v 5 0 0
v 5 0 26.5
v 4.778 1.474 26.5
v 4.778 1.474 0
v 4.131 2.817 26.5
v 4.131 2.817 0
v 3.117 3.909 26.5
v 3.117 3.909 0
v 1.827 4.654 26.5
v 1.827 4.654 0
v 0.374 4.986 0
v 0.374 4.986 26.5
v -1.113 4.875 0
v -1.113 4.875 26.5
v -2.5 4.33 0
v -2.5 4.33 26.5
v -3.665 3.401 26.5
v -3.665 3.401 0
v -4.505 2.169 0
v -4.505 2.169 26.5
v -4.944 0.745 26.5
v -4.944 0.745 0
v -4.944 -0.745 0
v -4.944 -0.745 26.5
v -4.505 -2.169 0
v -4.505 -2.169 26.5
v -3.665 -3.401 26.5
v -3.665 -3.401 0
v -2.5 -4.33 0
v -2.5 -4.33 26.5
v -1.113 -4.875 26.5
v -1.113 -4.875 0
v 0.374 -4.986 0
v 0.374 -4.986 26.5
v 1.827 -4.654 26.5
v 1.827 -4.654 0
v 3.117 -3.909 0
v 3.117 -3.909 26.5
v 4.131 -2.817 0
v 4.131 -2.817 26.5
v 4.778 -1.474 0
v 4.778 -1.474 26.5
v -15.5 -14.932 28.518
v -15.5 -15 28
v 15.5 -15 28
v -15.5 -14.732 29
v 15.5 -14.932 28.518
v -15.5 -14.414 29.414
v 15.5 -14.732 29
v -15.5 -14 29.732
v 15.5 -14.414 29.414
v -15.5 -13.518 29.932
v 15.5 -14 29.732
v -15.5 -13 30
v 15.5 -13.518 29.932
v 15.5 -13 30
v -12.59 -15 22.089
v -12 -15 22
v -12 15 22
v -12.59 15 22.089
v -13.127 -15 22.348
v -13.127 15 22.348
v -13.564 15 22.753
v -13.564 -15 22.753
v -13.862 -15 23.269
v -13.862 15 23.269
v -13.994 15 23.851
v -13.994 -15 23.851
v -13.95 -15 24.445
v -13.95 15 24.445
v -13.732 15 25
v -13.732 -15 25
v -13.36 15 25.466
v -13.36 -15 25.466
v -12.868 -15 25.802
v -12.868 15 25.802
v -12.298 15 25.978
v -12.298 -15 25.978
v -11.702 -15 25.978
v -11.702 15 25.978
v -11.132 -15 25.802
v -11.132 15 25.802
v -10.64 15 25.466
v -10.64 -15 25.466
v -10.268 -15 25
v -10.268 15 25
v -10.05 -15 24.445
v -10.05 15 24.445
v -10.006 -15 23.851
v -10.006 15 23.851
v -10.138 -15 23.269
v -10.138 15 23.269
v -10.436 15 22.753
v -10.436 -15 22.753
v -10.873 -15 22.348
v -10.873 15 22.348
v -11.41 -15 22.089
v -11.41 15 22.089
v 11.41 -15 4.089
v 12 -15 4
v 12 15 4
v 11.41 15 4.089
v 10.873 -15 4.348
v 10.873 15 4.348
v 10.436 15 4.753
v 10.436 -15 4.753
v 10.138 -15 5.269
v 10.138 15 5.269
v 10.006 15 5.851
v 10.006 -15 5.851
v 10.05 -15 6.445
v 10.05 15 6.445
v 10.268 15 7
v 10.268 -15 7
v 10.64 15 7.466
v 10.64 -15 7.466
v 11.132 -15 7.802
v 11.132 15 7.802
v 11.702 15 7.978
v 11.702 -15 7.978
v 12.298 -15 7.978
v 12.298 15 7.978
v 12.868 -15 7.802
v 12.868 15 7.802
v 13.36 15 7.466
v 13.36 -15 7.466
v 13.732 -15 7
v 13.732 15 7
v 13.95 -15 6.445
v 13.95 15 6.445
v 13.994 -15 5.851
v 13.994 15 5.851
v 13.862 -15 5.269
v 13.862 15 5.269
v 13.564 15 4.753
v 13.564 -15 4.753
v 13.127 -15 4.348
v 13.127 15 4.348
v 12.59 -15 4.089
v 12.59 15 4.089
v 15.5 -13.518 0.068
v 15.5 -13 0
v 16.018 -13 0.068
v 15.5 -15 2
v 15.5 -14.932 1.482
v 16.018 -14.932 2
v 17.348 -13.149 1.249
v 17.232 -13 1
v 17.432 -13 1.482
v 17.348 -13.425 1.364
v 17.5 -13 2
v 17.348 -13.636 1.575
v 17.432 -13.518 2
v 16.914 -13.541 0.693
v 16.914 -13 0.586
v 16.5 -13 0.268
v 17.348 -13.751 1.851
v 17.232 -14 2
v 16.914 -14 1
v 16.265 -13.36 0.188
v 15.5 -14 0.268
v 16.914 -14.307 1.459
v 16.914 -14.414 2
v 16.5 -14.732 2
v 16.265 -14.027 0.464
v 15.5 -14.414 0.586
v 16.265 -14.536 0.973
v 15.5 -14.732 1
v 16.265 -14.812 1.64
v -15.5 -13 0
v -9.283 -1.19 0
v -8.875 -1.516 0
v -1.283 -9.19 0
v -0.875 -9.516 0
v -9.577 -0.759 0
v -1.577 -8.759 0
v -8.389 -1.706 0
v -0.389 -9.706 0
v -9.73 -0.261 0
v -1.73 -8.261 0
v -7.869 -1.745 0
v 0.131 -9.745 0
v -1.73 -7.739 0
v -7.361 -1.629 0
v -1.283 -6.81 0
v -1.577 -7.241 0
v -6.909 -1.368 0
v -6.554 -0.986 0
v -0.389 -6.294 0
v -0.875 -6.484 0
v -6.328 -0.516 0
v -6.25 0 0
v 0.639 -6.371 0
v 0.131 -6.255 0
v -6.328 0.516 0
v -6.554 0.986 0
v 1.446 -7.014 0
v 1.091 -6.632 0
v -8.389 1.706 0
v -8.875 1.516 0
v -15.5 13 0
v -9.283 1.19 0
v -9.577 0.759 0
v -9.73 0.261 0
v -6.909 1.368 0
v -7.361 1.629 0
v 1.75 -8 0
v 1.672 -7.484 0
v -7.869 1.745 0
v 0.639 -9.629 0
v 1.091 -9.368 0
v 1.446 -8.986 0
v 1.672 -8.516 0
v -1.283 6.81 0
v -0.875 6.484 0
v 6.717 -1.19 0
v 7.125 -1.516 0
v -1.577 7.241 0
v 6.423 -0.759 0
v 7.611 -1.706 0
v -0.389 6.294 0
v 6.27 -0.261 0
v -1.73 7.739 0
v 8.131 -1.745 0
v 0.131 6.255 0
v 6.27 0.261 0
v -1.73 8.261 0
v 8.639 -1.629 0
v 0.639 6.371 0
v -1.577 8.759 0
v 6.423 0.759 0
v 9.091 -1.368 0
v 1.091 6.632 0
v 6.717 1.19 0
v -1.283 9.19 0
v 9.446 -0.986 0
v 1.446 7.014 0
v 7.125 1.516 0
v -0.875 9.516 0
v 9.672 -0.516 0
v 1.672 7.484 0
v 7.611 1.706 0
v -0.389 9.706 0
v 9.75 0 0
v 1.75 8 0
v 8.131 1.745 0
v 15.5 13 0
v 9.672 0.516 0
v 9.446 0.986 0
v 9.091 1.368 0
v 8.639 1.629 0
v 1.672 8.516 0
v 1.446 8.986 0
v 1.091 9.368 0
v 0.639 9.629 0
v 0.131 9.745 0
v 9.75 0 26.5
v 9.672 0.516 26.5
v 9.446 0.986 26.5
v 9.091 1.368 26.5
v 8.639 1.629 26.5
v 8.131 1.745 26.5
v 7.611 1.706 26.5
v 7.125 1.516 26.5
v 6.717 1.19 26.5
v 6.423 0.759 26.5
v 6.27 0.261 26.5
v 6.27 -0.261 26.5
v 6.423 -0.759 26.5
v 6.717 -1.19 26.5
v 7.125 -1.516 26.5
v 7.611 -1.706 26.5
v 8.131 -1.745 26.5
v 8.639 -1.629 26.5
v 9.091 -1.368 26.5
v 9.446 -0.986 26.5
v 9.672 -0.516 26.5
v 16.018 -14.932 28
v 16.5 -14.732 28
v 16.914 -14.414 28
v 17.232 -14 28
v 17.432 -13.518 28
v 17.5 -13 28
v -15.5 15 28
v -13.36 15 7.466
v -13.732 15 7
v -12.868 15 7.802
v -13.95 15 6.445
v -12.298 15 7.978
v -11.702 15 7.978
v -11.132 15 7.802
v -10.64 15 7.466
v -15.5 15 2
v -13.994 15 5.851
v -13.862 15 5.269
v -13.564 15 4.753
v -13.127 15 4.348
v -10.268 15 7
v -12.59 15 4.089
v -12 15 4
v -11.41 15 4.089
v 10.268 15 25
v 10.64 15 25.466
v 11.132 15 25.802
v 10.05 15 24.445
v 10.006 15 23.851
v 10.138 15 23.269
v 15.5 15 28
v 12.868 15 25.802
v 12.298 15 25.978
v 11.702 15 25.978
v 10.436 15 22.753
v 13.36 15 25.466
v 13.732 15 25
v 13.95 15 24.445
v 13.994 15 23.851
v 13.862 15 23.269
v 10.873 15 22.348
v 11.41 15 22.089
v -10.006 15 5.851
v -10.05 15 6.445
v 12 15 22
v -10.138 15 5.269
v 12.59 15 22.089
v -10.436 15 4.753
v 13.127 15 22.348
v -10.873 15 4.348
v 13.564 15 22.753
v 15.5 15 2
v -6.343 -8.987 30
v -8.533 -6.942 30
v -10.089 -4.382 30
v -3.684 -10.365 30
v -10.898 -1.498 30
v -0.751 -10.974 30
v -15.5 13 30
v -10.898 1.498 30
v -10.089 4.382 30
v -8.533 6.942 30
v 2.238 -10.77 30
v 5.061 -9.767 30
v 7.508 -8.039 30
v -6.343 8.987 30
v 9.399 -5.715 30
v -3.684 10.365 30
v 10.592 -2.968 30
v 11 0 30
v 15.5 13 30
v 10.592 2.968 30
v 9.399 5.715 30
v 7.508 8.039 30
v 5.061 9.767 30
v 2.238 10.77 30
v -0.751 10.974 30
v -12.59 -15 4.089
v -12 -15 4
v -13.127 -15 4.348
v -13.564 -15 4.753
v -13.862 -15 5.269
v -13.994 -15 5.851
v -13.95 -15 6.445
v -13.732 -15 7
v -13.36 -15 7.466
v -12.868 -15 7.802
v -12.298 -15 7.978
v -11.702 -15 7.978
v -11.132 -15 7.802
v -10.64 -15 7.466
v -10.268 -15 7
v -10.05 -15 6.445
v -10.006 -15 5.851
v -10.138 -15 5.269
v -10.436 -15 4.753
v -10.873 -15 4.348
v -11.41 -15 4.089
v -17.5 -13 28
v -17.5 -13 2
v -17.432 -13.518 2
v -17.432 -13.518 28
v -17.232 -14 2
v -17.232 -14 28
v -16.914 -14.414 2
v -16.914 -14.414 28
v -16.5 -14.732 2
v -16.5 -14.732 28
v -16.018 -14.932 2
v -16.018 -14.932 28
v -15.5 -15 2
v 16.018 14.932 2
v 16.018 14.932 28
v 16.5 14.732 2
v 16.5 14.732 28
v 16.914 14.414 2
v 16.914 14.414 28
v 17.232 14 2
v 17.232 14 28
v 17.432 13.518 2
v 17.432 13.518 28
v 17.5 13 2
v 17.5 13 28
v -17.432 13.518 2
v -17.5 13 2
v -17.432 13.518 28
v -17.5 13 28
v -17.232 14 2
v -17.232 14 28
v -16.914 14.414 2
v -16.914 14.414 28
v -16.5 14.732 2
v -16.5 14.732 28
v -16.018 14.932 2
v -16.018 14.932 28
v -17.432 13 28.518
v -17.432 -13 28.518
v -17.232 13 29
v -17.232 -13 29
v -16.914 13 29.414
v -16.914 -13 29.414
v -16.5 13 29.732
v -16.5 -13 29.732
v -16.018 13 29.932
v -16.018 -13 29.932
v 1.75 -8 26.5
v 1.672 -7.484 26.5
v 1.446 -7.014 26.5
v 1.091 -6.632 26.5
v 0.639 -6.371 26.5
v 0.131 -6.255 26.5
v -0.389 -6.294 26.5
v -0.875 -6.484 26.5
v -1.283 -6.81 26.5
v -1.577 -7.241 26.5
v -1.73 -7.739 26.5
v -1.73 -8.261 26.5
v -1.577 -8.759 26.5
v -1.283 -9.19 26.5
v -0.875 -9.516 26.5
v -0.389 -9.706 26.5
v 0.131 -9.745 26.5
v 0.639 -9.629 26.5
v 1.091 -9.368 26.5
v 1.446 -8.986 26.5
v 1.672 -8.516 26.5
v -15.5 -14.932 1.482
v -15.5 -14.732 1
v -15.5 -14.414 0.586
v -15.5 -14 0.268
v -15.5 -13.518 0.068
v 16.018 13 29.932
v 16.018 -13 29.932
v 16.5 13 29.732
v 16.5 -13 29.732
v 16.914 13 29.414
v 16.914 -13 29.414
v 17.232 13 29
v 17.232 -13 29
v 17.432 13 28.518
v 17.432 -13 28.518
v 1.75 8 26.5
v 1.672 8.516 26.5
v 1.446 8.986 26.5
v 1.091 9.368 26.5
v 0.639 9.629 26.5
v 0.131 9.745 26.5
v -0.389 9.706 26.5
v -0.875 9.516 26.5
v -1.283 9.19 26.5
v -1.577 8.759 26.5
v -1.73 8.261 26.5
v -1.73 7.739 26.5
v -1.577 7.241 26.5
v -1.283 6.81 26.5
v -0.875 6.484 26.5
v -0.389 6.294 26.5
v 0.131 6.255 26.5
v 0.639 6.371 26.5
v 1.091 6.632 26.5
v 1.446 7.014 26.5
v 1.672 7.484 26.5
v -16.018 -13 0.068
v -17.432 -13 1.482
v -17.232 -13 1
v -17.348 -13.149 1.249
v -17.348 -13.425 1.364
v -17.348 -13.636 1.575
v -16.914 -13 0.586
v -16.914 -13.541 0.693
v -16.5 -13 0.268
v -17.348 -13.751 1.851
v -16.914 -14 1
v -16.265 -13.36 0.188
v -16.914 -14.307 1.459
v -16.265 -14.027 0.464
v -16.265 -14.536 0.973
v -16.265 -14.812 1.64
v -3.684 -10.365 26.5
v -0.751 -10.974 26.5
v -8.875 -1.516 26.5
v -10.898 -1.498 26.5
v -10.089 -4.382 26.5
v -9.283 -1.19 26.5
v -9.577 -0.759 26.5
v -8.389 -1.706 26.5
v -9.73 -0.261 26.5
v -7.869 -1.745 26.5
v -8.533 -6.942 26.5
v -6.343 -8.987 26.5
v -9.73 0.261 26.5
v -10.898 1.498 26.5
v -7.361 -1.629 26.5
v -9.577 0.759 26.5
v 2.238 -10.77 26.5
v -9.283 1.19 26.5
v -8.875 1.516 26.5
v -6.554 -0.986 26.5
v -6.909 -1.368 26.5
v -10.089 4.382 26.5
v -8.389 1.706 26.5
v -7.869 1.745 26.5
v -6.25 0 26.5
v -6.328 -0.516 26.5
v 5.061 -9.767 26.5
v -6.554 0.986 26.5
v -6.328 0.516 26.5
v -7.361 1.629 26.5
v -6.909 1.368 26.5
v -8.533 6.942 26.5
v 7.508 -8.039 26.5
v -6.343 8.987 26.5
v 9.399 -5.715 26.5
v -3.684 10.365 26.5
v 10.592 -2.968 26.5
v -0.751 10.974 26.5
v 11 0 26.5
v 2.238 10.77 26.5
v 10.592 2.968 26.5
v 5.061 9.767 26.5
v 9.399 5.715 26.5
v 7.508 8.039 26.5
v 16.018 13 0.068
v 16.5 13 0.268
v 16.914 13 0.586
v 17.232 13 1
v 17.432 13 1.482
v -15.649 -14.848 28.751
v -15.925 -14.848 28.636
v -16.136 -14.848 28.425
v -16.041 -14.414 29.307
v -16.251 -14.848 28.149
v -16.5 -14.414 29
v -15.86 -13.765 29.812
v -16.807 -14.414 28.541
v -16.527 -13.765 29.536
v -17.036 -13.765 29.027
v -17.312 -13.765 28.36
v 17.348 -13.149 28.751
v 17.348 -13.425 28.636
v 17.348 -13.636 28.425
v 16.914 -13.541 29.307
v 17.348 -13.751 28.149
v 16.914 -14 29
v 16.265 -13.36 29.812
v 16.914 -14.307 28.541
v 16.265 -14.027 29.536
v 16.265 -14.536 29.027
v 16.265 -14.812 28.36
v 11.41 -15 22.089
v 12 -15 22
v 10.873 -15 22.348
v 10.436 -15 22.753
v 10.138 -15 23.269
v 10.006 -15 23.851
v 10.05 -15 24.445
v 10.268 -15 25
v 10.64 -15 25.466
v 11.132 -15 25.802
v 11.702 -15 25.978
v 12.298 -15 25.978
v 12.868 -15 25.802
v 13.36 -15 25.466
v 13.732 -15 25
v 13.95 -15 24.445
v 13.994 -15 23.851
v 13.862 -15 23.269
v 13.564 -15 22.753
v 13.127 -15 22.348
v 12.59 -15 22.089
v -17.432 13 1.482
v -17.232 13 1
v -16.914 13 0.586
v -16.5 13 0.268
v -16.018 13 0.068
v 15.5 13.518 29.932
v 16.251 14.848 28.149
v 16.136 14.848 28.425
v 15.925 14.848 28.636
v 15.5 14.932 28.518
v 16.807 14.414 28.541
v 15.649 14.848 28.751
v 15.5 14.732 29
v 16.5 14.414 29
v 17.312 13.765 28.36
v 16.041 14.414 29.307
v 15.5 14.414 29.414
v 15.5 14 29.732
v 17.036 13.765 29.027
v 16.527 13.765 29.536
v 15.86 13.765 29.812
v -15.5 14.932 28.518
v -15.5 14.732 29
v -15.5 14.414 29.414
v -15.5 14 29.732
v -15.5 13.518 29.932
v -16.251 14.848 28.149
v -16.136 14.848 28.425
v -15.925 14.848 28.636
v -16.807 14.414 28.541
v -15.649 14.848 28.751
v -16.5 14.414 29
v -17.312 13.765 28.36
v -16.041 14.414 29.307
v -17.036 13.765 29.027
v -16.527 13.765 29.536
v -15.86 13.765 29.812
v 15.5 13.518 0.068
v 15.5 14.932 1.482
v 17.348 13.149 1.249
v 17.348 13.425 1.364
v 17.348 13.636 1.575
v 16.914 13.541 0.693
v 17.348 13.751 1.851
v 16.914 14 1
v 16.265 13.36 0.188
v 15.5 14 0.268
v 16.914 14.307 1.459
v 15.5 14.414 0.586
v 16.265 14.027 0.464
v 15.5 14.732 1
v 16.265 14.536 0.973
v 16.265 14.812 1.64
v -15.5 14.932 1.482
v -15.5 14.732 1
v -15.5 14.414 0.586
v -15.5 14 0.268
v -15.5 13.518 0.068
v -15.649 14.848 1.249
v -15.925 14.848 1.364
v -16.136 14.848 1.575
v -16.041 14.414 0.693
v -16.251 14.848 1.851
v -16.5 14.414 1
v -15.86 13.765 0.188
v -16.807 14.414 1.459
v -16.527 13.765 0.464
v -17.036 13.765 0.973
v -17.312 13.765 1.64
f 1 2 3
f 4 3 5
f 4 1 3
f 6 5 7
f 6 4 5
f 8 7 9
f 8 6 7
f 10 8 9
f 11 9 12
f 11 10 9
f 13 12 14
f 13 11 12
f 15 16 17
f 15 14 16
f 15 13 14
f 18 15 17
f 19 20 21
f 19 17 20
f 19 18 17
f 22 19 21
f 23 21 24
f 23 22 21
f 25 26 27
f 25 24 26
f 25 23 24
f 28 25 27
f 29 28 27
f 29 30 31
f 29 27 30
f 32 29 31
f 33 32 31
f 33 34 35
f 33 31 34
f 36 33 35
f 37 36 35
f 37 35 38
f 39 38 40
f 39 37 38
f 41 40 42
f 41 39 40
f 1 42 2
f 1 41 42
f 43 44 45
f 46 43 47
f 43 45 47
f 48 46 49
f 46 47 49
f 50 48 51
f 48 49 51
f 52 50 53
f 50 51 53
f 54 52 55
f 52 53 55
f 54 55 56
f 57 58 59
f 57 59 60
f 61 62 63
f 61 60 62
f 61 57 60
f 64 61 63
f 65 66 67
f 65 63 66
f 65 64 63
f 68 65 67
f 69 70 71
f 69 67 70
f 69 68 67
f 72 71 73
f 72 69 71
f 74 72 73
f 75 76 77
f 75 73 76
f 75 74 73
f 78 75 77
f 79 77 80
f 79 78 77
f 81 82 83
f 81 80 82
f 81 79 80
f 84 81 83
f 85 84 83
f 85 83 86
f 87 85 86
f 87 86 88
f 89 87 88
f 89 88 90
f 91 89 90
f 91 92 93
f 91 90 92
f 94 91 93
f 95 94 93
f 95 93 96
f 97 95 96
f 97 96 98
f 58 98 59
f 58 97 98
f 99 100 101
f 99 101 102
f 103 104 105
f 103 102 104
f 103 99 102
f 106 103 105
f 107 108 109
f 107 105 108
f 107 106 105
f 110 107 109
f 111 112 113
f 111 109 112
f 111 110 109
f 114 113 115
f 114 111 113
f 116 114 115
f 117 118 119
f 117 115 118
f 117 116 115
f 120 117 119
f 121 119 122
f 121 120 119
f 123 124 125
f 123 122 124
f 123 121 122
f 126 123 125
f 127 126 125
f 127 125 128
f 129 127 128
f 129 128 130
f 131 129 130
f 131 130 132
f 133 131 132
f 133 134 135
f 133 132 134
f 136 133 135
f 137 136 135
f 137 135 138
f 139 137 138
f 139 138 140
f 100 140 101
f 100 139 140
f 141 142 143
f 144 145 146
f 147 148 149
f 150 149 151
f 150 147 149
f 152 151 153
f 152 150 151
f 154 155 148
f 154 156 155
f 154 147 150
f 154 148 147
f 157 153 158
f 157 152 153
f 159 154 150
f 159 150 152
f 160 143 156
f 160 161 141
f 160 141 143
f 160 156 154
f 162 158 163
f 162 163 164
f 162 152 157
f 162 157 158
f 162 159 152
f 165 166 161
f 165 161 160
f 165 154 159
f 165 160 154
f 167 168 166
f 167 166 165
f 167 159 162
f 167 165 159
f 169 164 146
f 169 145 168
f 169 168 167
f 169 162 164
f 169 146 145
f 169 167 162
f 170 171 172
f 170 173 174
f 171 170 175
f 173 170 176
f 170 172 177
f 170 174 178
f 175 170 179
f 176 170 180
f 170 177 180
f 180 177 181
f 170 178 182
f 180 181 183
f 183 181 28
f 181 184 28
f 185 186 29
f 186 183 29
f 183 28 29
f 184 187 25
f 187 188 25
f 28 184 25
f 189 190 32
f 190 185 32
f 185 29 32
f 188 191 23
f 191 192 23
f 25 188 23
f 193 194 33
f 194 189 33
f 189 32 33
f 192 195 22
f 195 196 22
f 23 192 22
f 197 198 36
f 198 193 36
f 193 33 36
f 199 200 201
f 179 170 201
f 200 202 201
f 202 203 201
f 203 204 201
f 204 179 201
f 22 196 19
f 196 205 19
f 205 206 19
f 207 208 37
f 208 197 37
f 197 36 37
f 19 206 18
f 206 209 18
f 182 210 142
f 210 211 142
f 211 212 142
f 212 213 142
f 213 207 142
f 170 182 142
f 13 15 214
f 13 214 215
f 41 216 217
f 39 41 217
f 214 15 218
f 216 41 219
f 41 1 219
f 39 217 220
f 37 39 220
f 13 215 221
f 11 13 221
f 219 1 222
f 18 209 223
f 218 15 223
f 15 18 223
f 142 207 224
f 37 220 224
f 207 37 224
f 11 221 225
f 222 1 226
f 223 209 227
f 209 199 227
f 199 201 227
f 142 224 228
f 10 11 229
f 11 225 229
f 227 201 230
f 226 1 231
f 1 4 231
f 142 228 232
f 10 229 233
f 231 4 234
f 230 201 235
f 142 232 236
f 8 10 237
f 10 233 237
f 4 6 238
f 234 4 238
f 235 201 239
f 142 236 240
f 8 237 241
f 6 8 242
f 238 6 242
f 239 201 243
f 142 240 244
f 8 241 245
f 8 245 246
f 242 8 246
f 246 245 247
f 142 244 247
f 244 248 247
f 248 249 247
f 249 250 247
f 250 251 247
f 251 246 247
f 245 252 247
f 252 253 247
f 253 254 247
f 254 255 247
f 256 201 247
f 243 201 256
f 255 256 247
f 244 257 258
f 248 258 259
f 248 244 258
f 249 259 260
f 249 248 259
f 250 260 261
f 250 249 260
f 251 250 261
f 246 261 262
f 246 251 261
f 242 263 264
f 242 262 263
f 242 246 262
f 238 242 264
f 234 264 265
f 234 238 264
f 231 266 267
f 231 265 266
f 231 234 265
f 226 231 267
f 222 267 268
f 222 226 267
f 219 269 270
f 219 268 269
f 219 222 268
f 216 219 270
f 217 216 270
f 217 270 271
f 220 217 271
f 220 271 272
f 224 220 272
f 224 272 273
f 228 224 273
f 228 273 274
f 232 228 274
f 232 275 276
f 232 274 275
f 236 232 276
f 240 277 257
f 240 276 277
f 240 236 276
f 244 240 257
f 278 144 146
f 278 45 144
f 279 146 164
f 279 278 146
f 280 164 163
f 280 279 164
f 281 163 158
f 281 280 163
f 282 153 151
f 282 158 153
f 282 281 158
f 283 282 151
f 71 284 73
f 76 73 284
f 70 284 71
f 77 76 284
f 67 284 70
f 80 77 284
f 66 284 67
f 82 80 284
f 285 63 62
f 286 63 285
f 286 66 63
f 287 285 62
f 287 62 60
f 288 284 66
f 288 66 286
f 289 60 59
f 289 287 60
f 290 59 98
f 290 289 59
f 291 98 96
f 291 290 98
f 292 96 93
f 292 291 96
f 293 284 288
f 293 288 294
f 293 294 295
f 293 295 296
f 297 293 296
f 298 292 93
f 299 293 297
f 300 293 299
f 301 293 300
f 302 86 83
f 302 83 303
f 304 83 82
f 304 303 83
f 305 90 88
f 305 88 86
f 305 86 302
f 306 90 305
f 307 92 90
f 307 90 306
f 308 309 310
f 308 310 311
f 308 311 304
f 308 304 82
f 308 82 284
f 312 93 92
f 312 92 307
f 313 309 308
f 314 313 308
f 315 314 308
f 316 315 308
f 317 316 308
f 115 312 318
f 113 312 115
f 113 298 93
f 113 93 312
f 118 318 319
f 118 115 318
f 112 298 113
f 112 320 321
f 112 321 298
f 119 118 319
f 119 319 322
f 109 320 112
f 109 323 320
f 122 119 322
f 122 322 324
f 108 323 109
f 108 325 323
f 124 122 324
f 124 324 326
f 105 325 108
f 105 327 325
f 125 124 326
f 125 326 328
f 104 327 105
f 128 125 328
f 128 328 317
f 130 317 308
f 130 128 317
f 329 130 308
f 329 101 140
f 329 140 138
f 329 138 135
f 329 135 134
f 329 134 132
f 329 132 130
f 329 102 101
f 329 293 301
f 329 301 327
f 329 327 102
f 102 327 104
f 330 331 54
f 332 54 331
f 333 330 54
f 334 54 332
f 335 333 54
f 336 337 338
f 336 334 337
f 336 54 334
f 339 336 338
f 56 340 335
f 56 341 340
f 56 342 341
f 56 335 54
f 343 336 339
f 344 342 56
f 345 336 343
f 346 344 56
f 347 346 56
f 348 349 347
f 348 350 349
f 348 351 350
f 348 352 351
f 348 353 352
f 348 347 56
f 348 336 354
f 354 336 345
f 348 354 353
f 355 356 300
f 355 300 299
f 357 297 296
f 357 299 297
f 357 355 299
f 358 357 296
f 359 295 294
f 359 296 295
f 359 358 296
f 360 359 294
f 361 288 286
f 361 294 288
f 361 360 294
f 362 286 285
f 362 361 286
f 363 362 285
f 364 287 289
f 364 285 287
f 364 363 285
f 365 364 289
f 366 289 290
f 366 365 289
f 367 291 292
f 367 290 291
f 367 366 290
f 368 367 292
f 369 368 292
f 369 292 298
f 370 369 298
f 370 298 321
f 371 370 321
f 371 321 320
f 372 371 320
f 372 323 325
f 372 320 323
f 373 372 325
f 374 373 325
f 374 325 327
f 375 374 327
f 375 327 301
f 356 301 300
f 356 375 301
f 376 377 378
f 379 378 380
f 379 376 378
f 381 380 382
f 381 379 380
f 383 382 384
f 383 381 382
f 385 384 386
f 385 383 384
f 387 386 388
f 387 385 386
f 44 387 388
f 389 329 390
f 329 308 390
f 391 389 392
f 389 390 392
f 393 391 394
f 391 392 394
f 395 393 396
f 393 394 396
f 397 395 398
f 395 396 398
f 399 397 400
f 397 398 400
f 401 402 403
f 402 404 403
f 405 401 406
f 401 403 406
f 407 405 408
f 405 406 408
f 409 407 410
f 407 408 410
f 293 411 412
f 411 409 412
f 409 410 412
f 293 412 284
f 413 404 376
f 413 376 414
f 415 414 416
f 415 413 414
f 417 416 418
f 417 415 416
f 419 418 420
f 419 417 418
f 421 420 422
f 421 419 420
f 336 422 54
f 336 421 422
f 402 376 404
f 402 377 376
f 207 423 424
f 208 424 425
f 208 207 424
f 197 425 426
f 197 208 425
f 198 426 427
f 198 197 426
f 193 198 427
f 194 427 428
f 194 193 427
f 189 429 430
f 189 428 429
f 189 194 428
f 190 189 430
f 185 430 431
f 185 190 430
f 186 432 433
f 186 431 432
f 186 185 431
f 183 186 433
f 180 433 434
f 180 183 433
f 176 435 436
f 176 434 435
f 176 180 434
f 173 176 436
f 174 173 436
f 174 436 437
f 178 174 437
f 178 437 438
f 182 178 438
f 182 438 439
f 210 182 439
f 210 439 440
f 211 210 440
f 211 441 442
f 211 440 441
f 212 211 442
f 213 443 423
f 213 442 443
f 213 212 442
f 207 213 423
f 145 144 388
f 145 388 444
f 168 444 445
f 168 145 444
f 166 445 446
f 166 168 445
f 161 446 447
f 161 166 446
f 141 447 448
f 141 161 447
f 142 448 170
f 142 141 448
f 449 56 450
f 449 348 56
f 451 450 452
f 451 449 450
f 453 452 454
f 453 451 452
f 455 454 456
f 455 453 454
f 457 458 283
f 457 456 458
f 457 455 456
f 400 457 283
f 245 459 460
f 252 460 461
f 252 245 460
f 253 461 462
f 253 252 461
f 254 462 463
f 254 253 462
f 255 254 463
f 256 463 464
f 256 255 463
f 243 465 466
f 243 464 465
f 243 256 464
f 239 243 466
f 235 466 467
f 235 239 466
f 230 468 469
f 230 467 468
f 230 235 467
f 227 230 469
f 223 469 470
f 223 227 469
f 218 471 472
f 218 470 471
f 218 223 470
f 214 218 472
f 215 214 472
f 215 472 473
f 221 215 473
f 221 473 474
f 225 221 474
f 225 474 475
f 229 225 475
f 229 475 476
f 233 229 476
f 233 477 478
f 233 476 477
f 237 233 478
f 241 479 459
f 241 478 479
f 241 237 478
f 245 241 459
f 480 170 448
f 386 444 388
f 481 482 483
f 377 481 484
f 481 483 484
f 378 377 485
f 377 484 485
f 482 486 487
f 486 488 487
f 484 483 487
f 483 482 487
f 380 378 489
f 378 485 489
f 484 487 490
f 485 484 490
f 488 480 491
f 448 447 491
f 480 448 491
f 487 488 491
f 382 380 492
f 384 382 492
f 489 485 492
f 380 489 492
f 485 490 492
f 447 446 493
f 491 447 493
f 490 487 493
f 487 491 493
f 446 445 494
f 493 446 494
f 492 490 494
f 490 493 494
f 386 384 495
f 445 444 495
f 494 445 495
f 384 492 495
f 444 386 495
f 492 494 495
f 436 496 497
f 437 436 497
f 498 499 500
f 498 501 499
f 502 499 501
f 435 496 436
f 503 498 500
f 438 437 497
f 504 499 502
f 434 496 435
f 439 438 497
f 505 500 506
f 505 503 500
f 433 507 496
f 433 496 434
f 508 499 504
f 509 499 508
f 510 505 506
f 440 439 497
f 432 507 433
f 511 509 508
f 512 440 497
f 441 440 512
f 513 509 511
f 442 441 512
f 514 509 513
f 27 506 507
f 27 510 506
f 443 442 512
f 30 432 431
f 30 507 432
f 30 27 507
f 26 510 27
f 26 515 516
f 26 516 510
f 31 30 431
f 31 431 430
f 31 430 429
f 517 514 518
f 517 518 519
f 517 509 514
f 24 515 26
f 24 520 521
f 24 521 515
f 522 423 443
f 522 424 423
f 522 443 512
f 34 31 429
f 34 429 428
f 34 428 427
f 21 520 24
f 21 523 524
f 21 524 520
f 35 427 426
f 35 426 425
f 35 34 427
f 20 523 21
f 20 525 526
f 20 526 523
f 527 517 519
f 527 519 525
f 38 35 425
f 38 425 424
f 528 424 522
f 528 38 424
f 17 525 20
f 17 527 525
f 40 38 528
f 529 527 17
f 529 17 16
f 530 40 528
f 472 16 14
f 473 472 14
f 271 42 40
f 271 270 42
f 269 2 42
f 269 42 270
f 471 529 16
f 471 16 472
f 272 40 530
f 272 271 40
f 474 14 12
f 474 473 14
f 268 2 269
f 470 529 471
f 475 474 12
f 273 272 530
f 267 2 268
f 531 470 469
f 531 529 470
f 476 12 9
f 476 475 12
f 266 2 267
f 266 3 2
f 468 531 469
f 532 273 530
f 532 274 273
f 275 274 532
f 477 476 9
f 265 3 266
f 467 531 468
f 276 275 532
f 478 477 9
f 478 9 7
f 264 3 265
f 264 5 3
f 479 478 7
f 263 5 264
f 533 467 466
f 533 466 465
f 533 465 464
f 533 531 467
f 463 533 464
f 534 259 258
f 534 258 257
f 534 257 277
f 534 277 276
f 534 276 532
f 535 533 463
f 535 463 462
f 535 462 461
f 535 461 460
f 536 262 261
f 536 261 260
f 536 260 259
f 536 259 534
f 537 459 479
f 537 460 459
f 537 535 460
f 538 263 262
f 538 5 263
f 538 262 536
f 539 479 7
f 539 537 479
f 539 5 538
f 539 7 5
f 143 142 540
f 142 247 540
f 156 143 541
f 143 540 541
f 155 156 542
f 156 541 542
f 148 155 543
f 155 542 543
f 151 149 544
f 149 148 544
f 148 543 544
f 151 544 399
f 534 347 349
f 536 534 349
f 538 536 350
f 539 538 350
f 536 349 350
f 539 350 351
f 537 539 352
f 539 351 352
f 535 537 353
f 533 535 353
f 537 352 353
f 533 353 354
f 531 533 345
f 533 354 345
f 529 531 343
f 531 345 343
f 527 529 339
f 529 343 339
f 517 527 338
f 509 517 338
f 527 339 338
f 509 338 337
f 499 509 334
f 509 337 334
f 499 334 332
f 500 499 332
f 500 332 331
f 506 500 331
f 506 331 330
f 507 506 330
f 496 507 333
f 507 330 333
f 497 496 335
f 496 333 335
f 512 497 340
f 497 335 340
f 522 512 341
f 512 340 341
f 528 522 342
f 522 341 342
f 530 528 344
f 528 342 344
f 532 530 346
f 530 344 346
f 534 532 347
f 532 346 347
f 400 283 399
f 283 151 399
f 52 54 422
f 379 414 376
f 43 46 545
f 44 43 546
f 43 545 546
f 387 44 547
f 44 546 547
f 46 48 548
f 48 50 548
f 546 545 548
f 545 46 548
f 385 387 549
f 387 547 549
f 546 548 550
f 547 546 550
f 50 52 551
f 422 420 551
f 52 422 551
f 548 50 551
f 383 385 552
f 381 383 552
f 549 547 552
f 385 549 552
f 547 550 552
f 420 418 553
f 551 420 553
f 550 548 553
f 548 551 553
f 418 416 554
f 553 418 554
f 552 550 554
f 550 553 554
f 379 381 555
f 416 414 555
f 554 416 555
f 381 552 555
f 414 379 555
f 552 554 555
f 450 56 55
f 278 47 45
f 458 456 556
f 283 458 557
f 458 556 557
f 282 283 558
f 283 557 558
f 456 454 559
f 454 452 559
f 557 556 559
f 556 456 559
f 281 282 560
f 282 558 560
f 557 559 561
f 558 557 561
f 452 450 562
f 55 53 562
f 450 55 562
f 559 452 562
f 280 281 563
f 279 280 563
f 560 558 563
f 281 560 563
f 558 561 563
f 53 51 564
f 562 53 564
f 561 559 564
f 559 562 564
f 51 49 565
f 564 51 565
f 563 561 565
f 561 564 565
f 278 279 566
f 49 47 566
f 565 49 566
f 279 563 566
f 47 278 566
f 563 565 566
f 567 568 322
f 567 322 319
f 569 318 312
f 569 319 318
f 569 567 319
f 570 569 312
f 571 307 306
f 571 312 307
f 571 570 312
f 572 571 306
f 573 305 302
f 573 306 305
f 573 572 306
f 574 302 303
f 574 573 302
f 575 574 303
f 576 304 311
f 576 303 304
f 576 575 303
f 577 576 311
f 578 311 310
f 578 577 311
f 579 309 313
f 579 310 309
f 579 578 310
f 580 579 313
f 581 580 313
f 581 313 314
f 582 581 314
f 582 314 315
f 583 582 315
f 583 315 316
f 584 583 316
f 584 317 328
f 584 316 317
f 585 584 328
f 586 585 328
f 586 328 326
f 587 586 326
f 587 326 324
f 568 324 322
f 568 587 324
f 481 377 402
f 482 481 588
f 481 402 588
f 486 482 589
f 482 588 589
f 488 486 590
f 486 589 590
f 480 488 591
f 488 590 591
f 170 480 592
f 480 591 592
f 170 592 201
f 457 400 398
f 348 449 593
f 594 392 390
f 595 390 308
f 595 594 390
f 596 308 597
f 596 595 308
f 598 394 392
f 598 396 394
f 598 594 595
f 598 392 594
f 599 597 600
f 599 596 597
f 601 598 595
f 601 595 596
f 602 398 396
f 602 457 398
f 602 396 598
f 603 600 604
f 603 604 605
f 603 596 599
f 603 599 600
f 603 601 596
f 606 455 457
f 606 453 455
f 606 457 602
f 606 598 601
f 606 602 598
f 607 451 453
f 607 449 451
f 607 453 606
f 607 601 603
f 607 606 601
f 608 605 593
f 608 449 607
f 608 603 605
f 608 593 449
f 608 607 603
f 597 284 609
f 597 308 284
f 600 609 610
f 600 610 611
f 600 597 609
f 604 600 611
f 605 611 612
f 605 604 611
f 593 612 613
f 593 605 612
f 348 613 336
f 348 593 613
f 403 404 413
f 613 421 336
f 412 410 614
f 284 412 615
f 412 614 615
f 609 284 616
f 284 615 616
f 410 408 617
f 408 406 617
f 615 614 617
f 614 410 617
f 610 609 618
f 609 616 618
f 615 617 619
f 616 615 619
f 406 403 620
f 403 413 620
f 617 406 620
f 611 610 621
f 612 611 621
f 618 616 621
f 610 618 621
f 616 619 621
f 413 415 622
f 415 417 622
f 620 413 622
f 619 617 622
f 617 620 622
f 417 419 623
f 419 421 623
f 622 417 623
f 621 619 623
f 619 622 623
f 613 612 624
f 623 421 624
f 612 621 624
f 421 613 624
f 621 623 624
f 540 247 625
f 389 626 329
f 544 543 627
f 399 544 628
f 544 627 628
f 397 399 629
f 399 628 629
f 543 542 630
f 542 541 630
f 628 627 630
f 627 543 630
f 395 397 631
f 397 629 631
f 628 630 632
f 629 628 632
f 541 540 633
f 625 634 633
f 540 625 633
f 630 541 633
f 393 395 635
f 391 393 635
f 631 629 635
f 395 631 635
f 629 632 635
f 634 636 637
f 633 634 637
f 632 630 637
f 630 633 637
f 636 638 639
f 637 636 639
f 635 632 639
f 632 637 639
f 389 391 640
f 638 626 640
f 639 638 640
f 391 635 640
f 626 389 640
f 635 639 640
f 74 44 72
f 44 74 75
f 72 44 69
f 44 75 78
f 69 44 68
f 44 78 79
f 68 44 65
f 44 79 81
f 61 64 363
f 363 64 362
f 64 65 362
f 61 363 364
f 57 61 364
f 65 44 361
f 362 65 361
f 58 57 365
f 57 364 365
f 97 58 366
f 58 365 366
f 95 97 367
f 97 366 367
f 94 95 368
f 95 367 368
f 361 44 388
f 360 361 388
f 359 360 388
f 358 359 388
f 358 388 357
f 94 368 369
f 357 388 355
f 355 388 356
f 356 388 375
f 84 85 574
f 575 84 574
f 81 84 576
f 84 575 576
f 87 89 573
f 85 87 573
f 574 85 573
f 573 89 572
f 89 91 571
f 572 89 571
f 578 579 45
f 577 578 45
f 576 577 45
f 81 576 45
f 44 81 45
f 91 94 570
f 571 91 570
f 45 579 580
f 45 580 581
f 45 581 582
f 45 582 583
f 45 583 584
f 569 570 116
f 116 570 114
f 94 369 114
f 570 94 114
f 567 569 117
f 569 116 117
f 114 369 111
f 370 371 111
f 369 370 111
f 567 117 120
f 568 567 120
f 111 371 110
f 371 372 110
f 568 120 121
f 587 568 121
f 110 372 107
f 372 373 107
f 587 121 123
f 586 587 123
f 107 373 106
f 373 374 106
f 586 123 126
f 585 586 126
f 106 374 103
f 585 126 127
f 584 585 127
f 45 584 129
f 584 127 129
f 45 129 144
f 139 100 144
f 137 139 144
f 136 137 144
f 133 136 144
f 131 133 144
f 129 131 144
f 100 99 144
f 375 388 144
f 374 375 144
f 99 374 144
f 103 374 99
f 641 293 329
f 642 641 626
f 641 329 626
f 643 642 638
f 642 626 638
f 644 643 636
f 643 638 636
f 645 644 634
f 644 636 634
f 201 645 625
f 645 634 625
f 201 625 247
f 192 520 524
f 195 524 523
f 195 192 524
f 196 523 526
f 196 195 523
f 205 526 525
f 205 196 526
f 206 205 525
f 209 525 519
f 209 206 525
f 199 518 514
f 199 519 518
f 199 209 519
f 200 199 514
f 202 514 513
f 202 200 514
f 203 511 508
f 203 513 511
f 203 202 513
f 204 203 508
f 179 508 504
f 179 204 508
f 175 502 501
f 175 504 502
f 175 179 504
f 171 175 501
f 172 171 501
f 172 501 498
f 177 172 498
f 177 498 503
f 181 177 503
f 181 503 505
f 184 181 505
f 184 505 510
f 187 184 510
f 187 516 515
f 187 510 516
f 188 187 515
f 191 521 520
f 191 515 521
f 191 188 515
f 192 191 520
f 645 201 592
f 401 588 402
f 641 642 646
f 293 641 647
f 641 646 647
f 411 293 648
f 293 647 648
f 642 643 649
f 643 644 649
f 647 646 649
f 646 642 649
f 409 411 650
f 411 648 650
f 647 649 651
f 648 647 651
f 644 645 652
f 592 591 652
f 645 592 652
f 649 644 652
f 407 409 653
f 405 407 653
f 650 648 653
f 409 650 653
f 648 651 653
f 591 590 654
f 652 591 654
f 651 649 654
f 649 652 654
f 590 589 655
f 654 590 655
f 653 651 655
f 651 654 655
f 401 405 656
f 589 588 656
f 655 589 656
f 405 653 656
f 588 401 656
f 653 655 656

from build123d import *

# Parameters (mm, degrees)
CROQUIS1_W                 = 35
CROQUIS1_H                 = 30
CROQUIS1_R                 = 5
CROQUIS1_R_2               = 1.75
SALIENTE_EXTRUIR1_DEPTH    = 30
CROQUIS2_R                 = 11
CORTAR_EXTRUIR1_DEPTH      = 3.5
REDONDEO2_R                = 2
CORTAR_EXTRUIR2_DEPTH      = 10
CORTAR_EXTRUIR2_DEPTH_BACK = 31.5
CROQUIS3_R                 = 2


with BuildPart() as part:
    # Croquis1 → Saliente-Extruir1 (new body)
    with BuildSketch(Plane.XY):
        Rectangle(CROQUIS1_W, CROQUIS1_H)
        Circle(CROQUIS1_R, mode=Mode.SUBTRACT)
        with Locations((0, 8)):
            Circle(CROQUIS1_R_2, mode=Mode.SUBTRACT)
        with Locations((8, 0)):
            Circle(CROQUIS1_R_2, mode=Mode.SUBTRACT)
        with Locations((0, -8)):
            Circle(CROQUIS1_R_2, mode=Mode.SUBTRACT)
        with Locations((-8, 0)):
            Circle(CROQUIS1_R_2, mode=Mode.SUBTRACT)
    extrude(amount=SALIENTE_EXTRUIR1_DEPTH)

    # Croquis2 → Cortar-Extruir1 (cut)
    with BuildSketch(Plane.XY.offset(30)):
        Circle(CROQUIS2_R)
    extrude(amount=-CORTAR_EXTRUIR1_DEPTH, mode=Mode.SUBTRACT)

    # Redondeo2
    redondeo2_edges = [part.edges().sort_by_distance(p)[0] for p in [
        (-17.5, 0, 30),
        (0, -15, 30),
        (17.5, 0, 30),
        (0, -15, 0),
        (-17.5, 0, 0),
        (0, 15, 0),
        (17.5, 0, 0),
        (17.5, -15, 15),
        (-17.5, -15, 15),
        (-17.5, 15, 15),
        (17.5, 15, 15),
        (0, 15, 30),
    ]]
    fillet(redondeo2_edges, radius=REDONDEO2_R)

    # Croquis3 → Cortar-Extruir2 (cut, two sides: drawn at the far end of the back side and taken through both)
    with BuildSketch(Plane(origin=(0, 15, 0), x_dir=(1, 0, 0), z_dir=(0, 1, 0)).offset(-CORTAR_EXTRUIR2_DEPTH_BACK)):
        with Locations(Location((-12, -24, 0), (0, 0, 90))):
            Circle(CROQUIS3_R)
        with Locations(Location((12, -24, 0), (0, 0, 90))):
            Circle(CROQUIS3_R)
        with Locations(Location((-12, -6, 0), (0, 0, 90))):
            Circle(CROQUIS3_R)
        with Locations(Location((12, -6, 0), (0, 0, 90))):
            Circle(CROQUIS3_R)
    extrude(amount=CORTAR_EXTRUIR2_DEPTH + CORTAR_EXTRUIR2_DEPTH_BACK, mode=Mode.SUBTRACT)


solid = part.part
